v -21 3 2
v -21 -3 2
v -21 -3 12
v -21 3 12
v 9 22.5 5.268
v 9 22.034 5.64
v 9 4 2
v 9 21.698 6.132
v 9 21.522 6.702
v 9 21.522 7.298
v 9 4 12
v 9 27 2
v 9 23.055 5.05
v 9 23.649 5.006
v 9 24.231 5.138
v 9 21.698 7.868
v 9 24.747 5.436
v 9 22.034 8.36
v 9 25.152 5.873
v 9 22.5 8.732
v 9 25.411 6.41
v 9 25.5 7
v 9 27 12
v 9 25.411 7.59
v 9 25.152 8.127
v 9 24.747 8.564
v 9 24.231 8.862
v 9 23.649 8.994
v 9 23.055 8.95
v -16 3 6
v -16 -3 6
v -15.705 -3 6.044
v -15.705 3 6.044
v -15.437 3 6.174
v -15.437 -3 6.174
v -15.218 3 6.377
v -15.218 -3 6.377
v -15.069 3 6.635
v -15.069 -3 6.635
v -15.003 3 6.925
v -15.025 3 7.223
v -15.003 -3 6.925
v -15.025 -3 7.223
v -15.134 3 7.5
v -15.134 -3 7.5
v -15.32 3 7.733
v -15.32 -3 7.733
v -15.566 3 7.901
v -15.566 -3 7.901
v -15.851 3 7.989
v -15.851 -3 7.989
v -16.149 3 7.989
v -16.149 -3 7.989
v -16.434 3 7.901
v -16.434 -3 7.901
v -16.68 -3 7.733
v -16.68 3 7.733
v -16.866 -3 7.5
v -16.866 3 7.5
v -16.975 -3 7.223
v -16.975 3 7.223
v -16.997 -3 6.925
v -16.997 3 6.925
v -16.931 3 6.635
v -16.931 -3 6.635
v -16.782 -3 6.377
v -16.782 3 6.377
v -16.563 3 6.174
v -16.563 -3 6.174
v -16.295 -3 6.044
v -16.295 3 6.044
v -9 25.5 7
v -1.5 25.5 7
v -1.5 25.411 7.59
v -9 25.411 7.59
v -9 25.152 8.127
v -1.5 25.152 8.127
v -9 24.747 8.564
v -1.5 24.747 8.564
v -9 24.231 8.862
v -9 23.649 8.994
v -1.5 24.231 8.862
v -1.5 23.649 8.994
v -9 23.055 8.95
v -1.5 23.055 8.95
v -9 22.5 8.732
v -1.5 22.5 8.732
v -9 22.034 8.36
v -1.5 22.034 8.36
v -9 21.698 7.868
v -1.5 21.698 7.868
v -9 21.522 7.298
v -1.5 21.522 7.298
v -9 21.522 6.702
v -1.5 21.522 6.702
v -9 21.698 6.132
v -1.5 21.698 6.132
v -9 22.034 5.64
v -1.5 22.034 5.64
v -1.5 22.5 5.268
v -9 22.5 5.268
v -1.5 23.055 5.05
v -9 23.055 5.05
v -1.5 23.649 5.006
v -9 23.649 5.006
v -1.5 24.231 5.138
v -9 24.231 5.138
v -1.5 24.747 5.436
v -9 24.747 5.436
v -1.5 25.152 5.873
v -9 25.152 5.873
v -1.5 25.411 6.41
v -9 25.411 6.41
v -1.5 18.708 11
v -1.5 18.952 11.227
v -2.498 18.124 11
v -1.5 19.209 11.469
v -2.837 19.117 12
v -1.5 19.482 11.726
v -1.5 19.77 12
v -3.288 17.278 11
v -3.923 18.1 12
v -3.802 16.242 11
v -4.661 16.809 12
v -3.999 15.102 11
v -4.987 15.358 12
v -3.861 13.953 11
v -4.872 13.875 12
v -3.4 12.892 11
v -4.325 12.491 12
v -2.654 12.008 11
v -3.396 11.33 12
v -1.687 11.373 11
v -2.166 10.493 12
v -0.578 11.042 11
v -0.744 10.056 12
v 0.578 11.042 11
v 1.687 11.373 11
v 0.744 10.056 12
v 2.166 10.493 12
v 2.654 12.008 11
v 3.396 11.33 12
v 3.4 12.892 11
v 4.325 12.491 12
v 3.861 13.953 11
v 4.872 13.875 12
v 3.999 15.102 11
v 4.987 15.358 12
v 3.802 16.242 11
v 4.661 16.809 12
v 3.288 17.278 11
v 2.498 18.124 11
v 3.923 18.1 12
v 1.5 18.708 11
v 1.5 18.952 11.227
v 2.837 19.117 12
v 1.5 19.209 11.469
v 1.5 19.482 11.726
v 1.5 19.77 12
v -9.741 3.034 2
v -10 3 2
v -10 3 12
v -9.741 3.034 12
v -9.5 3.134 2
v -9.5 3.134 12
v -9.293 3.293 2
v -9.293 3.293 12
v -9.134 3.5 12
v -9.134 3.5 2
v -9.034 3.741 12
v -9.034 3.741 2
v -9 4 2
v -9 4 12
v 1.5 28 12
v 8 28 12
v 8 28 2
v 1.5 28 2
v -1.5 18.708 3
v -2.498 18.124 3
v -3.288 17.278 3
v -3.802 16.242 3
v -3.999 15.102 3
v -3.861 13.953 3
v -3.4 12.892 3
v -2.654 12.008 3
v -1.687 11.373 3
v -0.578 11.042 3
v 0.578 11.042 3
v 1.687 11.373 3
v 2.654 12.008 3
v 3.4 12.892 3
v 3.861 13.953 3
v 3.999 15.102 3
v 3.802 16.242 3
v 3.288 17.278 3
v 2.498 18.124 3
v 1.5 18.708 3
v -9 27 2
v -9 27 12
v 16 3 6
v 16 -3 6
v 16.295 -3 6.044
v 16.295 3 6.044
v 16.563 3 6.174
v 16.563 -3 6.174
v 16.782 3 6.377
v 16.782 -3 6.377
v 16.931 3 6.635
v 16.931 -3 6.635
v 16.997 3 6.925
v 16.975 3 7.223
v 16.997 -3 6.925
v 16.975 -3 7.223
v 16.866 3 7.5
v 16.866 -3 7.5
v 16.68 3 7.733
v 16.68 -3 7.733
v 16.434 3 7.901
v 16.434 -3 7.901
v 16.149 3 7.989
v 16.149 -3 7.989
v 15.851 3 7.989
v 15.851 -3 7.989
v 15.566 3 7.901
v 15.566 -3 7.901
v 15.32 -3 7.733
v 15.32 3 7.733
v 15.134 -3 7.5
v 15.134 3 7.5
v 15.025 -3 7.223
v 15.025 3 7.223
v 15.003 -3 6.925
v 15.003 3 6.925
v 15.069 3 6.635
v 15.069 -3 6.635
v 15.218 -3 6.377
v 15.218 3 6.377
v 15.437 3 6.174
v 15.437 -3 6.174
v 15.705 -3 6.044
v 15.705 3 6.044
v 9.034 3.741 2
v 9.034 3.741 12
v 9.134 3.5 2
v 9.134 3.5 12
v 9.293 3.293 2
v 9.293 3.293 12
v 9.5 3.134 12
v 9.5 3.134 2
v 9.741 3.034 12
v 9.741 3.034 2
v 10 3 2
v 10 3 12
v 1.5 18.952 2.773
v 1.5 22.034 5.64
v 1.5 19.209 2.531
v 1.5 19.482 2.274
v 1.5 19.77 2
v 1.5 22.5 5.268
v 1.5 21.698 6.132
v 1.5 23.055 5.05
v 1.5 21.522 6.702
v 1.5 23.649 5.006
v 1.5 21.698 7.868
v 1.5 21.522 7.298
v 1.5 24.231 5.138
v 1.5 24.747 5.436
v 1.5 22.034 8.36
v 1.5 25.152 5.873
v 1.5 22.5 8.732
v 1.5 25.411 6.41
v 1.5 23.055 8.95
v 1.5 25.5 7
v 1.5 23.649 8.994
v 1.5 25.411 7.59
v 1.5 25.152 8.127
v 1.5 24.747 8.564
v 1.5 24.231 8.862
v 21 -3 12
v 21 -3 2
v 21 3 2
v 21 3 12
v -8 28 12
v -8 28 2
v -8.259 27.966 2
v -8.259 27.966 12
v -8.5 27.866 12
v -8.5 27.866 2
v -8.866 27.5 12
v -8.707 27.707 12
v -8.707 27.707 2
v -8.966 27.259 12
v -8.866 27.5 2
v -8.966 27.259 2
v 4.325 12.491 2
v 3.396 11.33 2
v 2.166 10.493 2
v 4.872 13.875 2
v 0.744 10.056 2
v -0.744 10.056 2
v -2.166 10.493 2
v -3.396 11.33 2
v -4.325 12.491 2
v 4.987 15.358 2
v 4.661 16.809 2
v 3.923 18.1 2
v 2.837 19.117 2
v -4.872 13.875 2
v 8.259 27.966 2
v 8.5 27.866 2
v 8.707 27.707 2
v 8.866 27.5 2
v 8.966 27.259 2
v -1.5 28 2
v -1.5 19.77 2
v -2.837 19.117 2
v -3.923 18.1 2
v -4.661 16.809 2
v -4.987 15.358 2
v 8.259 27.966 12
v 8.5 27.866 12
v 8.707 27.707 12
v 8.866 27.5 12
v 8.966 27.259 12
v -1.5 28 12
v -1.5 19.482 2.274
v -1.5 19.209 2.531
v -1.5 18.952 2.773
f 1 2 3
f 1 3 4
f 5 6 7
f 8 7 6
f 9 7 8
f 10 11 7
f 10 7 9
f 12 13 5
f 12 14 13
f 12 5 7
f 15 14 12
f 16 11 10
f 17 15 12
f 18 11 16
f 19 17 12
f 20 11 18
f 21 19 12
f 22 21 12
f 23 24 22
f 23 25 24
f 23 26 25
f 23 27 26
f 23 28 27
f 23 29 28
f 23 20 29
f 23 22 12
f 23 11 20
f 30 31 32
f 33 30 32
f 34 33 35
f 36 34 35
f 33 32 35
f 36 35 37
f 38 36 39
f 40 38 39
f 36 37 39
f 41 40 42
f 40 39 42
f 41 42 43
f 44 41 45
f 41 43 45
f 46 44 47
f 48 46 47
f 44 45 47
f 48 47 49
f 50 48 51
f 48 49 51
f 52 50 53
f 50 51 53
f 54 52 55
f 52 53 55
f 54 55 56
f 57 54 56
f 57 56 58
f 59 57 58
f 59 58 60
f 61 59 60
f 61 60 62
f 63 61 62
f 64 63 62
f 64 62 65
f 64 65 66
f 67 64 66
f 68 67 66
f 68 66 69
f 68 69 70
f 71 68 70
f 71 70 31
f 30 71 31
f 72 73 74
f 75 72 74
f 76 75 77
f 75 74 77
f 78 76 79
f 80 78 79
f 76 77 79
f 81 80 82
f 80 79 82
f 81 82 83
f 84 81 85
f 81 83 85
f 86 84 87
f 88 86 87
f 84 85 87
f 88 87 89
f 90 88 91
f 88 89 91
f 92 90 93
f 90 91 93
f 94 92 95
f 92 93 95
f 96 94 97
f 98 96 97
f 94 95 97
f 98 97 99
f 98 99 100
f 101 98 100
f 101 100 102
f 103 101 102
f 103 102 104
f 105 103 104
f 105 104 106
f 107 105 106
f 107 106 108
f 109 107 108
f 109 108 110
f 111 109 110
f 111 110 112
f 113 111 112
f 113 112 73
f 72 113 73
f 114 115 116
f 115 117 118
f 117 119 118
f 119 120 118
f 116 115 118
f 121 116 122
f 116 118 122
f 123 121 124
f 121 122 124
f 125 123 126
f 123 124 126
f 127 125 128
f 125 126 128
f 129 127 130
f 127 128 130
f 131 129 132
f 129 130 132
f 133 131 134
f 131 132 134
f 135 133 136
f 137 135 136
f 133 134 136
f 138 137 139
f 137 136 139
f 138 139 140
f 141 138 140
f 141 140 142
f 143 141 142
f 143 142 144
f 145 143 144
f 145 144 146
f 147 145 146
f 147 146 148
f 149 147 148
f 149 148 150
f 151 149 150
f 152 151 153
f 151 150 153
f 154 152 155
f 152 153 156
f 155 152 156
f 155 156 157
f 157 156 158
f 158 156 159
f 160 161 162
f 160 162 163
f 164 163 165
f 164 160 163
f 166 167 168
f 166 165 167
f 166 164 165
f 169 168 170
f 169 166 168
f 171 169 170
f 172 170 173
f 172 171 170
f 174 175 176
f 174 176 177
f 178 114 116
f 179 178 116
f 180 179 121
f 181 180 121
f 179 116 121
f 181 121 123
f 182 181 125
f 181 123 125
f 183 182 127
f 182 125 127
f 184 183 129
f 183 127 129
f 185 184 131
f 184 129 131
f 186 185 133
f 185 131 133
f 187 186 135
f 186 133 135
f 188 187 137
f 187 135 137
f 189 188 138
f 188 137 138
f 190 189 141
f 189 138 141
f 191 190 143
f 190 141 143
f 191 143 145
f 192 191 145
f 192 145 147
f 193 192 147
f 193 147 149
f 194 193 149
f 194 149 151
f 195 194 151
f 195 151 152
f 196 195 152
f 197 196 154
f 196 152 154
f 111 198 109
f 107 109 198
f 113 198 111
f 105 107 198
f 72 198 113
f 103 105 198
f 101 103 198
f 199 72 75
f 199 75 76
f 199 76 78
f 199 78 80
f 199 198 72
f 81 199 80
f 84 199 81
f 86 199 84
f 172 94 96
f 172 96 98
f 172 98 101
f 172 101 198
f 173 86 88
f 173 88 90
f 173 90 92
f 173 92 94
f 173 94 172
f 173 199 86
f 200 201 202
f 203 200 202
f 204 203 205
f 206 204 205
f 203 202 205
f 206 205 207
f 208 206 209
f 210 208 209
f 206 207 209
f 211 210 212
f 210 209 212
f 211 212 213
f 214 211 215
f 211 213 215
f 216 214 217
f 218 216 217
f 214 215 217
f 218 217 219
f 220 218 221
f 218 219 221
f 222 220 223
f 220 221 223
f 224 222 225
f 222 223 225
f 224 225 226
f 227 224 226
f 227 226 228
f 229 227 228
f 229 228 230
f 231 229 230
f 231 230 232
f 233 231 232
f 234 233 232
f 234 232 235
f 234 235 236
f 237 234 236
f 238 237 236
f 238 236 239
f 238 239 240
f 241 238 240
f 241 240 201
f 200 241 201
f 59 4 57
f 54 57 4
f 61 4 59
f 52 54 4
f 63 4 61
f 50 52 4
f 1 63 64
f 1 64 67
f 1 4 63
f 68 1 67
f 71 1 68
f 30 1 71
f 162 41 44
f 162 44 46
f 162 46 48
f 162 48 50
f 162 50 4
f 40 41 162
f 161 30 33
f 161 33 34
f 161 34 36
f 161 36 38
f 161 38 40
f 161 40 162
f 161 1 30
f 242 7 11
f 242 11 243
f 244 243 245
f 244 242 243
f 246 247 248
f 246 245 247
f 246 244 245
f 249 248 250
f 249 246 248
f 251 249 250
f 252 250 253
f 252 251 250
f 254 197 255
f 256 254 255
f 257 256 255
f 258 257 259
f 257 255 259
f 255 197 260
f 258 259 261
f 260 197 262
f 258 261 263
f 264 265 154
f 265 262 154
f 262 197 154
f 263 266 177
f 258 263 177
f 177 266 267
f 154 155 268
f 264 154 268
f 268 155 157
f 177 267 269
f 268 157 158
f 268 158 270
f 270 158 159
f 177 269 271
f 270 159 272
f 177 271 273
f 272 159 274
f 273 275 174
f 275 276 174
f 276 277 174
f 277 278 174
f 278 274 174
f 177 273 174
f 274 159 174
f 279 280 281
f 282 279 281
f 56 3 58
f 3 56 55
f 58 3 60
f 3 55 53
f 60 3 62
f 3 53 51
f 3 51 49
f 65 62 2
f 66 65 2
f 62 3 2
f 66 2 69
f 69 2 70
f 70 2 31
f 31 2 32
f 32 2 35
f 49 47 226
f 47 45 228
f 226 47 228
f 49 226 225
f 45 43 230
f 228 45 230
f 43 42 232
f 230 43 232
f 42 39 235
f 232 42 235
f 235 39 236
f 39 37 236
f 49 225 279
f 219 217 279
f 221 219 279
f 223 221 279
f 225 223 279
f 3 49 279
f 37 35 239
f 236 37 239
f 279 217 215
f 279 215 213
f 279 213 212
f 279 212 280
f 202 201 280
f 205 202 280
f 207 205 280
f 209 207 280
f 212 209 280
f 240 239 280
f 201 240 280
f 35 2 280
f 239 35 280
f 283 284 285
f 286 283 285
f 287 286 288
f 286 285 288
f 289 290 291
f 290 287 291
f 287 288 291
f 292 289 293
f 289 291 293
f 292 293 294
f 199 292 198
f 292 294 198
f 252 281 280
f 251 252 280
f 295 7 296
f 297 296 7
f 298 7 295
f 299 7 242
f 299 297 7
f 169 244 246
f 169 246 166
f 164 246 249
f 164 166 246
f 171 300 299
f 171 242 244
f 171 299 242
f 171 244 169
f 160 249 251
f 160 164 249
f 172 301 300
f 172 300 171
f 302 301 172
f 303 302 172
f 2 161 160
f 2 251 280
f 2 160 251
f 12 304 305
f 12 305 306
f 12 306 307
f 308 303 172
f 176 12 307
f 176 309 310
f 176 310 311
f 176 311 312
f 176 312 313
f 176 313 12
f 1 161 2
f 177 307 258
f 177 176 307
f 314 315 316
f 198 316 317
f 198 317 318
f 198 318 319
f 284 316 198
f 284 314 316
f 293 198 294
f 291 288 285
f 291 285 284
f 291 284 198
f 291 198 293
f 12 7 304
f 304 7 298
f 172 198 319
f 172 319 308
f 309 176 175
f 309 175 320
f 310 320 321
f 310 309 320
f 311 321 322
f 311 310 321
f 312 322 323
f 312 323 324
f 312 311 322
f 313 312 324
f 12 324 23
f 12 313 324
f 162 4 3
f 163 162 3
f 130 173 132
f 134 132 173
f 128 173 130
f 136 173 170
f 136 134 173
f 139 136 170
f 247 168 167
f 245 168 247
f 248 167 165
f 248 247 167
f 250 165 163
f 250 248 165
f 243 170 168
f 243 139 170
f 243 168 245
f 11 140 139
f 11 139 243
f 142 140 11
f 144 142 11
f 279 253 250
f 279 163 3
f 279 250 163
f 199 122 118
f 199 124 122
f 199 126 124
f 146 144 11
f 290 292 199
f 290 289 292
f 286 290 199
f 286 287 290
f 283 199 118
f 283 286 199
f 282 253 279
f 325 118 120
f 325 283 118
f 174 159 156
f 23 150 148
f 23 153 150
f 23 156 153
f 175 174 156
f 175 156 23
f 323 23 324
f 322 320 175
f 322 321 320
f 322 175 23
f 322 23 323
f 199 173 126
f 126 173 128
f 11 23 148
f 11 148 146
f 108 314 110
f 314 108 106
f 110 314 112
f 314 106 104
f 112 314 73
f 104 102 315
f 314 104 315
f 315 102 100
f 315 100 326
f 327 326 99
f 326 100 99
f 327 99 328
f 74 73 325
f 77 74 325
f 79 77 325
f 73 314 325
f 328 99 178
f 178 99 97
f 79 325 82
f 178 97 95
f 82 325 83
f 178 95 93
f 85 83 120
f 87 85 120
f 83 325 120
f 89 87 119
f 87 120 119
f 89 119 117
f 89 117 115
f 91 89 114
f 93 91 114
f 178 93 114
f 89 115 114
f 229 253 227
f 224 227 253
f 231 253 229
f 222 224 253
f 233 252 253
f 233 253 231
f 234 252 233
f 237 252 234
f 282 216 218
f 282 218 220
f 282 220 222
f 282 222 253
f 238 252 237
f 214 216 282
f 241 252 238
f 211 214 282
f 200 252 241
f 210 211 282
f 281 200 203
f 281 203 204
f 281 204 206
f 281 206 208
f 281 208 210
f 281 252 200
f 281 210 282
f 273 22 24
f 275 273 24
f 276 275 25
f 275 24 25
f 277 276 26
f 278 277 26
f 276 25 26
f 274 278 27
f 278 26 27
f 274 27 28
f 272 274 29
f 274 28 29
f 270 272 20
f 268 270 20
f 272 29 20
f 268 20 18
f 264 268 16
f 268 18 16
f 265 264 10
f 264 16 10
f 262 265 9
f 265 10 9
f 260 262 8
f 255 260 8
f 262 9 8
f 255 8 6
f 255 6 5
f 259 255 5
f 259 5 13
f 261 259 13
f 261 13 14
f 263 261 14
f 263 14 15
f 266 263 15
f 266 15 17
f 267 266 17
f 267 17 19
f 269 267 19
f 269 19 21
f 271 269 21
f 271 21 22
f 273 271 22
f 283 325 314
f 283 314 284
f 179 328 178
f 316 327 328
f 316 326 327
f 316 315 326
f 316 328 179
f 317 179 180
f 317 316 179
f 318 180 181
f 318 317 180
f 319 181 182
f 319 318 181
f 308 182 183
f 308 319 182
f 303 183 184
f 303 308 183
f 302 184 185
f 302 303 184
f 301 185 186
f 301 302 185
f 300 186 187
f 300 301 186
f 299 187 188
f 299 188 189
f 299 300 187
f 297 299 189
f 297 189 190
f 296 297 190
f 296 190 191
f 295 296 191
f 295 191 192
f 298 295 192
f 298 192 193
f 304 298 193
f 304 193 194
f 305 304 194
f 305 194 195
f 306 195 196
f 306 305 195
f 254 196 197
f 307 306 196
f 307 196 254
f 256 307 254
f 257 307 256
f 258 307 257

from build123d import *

# Parameters (mm, degrees)
SKETCH1_W           = 42
SKETCH1_H           = 6
BOSS_EXTRUDE1_DEPTH = 14
BOSS_EXTRUDE2_DEPTH = 14
SKETCH3_R           = 4
CUT_EXTRUDE1_DEPTH  = 14
SKETCH4_R           = 1
CUT_EXTRUDE2_DEPTH  = 14
FILLET1_R           = 1
FILLET2_R           = 1
FILLET3_R           = 1
FILLET4_R           = 1
CHAMFER1_SIZE       = 1
CHAMFER2_SIZE       = 1
CUT_EXTRUDE4_DEPTH  = 14
SKETCH7_R           = 2
CUT_EXTRUDE5_DEPTH  = 24
SKETCH10_W          = 63.901140572
SKETCH10_H          = 43.979020276
CUT_EXTRUDE8_DEPTH  = 2
SKETCH11_W          = 62.872788093
SKETCH11_H          = 44.7095382
CUT_EXTRUDE9_DEPTH  = 2
CHAMFER3_SIZE       = 1
CHAMFER4_SIZE       = 1


with BuildPart() as part:
    # Sketch1 → Boss-Extrude1 (new body)
    with BuildSketch(Plane.XY):
        Rectangle(SKETCH1_W, SKETCH1_H)
    extrude(amount=BOSS_EXTRUDE1_DEPTH)

    # Sketch2 → Boss-Extrude2 (add)
    with BuildSketch(Plane.XY.offset(14)):
        Polygon((0, 28), (-9, 28), (-9, 3), (9, 3), (9, 28), align=None)
    extrude(amount=-BOSS_EXTRUDE2_DEPTH)

    # Sketch3 → Cut-Extrude1 (cut)
    with BuildSketch(Plane.XY.offset(14)):
        with Locations((0, 15)):
            Circle(SKETCH3_R)
    extrude(amount=-CUT_EXTRUDE1_DEPTH, mode=Mode.SUBTRACT)

    # Sketch4 → Cut-Extrude2 (cut)
    with BuildSketch(Plane.XZ.offset(3)):
        with Locations(Location((-16, 7, 0), (0, 0, 270))):
            Circle(SKETCH4_R)
        with Locations(Location((16, 7, 0), (0, 0, 270))):
            Circle(SKETCH4_R)
    extrude(amount=-CUT_EXTRUDE2_DEPTH, mode=Mode.SUBTRACT)

    # Fillet1
    fillet1_edges = [part.edges().sort_by_distance(p)[0] for p in [
        (-9, 3, 7),
    ]]
    fillet(fillet1_edges, radius=FILLET1_R)

    # Fillet2
    fillet2_edges = [part.edges().sort_by_distance(p)[0] for p in [
        (9, 3, 7),
    ]]
    fillet(fillet2_edges, radius=FILLET2_R)

    # Fillet3
    fillet3_edges = [part.edges().sort_by_distance(p)[0] for p in [
        (-9, 28, 7),
    ]]
    fillet(fillet3_edges, radius=FILLET3_R)

    # Fillet4
    fillet4_edges = [part.edges().sort_by_distance(p)[0] for p in [
        (9, 28, 7),
    ]]
    fillet(fillet4_edges, radius=FILLET4_R)

    # Chamfer1
    chamfer1_edges = [part.edges().sort_by_distance(p)[0] for p in [
        (-4, 15, 14),
    ]]
    chamfer(chamfer1_edges, length=CHAMFER1_SIZE)

    # Chamfer2
    chamfer2_edges = [part.edges().sort_by_distance(p)[0] for p in [
        (-4, 15, 0),
    ]]
    chamfer(chamfer2_edges, length=CHAMFER2_SIZE)

    # Sketch6 → Cut-Extrude4 (cut)
    with BuildSketch(Plane.XY.offset(14)):
        with BuildLine():
            Line((0, 28), (-1.5, 28))
            Line((-1.5, 28), (-1.5, 18.708099244))
            ThreePointArc((-1.5, 18.708099244), (0, 19), (1.5, 18.708099244))
            Line((1.5, 18.708099244), (1.5, 28))
            Line((1.5, 28), (0, 28))
        make_face()
    extrude(amount=-CUT_EXTRUDE4_DEPTH, mode=Mode.SUBTRACT)

    # Sketch7 → Cut-Extrude5 (cut)
    with BuildSketch(Plane(origin=(9, 0, 0), x_dir=(0, 0, -1), z_dir=(1, 0, 0))):
        with Locations(Location((-7, 23.5, 0), (0, 0, 90))):
            Circle(SKETCH7_R)
    extrude(amount=-CUT_EXTRUDE5_DEPTH, mode=Mode.SUBTRACT)

    # Sketch10 → Cut-Extrude8 (cut)
    with BuildSketch(Plane.XY.offset(14)):
        with Locations((1.003303608, 14.168104251)):
            Rectangle(SKETCH10_W, SKETCH10_H)
    extrude(amount=-CUT_EXTRUDE8_DEPTH, mode=Mode.SUBTRACT)

    # Sketch11 → Cut-Extrude9 (cut)
    with BuildSketch(Plane(origin=(0, 0, 0), x_dir=(-1, 0, 0), z_dir=(0, 0, -1))):
        with Locations((3.111885471, 13.654031467)):
            Rectangle(SKETCH11_W, SKETCH11_H)
    extrude(amount=-CUT_EXTRUDE9_DEPTH, mode=Mode.SUBTRACT)

    # Chamfer3
    chamfer3_edges = [part.edges().sort_by_distance(p)[0] for p in [
        (0, 11, 12),
    ]]
    chamfer(chamfer3_edges, length=CHAMFER3_SIZE)

    # Chamfer4
    chamfer4_edges = [part.edges().sort_by_distance(p)[0] for p in [
        (0, 11, 2),
    ]]
    chamfer(chamfer4_edges, length=CHAMFER4_SIZE)


solid = part.part
